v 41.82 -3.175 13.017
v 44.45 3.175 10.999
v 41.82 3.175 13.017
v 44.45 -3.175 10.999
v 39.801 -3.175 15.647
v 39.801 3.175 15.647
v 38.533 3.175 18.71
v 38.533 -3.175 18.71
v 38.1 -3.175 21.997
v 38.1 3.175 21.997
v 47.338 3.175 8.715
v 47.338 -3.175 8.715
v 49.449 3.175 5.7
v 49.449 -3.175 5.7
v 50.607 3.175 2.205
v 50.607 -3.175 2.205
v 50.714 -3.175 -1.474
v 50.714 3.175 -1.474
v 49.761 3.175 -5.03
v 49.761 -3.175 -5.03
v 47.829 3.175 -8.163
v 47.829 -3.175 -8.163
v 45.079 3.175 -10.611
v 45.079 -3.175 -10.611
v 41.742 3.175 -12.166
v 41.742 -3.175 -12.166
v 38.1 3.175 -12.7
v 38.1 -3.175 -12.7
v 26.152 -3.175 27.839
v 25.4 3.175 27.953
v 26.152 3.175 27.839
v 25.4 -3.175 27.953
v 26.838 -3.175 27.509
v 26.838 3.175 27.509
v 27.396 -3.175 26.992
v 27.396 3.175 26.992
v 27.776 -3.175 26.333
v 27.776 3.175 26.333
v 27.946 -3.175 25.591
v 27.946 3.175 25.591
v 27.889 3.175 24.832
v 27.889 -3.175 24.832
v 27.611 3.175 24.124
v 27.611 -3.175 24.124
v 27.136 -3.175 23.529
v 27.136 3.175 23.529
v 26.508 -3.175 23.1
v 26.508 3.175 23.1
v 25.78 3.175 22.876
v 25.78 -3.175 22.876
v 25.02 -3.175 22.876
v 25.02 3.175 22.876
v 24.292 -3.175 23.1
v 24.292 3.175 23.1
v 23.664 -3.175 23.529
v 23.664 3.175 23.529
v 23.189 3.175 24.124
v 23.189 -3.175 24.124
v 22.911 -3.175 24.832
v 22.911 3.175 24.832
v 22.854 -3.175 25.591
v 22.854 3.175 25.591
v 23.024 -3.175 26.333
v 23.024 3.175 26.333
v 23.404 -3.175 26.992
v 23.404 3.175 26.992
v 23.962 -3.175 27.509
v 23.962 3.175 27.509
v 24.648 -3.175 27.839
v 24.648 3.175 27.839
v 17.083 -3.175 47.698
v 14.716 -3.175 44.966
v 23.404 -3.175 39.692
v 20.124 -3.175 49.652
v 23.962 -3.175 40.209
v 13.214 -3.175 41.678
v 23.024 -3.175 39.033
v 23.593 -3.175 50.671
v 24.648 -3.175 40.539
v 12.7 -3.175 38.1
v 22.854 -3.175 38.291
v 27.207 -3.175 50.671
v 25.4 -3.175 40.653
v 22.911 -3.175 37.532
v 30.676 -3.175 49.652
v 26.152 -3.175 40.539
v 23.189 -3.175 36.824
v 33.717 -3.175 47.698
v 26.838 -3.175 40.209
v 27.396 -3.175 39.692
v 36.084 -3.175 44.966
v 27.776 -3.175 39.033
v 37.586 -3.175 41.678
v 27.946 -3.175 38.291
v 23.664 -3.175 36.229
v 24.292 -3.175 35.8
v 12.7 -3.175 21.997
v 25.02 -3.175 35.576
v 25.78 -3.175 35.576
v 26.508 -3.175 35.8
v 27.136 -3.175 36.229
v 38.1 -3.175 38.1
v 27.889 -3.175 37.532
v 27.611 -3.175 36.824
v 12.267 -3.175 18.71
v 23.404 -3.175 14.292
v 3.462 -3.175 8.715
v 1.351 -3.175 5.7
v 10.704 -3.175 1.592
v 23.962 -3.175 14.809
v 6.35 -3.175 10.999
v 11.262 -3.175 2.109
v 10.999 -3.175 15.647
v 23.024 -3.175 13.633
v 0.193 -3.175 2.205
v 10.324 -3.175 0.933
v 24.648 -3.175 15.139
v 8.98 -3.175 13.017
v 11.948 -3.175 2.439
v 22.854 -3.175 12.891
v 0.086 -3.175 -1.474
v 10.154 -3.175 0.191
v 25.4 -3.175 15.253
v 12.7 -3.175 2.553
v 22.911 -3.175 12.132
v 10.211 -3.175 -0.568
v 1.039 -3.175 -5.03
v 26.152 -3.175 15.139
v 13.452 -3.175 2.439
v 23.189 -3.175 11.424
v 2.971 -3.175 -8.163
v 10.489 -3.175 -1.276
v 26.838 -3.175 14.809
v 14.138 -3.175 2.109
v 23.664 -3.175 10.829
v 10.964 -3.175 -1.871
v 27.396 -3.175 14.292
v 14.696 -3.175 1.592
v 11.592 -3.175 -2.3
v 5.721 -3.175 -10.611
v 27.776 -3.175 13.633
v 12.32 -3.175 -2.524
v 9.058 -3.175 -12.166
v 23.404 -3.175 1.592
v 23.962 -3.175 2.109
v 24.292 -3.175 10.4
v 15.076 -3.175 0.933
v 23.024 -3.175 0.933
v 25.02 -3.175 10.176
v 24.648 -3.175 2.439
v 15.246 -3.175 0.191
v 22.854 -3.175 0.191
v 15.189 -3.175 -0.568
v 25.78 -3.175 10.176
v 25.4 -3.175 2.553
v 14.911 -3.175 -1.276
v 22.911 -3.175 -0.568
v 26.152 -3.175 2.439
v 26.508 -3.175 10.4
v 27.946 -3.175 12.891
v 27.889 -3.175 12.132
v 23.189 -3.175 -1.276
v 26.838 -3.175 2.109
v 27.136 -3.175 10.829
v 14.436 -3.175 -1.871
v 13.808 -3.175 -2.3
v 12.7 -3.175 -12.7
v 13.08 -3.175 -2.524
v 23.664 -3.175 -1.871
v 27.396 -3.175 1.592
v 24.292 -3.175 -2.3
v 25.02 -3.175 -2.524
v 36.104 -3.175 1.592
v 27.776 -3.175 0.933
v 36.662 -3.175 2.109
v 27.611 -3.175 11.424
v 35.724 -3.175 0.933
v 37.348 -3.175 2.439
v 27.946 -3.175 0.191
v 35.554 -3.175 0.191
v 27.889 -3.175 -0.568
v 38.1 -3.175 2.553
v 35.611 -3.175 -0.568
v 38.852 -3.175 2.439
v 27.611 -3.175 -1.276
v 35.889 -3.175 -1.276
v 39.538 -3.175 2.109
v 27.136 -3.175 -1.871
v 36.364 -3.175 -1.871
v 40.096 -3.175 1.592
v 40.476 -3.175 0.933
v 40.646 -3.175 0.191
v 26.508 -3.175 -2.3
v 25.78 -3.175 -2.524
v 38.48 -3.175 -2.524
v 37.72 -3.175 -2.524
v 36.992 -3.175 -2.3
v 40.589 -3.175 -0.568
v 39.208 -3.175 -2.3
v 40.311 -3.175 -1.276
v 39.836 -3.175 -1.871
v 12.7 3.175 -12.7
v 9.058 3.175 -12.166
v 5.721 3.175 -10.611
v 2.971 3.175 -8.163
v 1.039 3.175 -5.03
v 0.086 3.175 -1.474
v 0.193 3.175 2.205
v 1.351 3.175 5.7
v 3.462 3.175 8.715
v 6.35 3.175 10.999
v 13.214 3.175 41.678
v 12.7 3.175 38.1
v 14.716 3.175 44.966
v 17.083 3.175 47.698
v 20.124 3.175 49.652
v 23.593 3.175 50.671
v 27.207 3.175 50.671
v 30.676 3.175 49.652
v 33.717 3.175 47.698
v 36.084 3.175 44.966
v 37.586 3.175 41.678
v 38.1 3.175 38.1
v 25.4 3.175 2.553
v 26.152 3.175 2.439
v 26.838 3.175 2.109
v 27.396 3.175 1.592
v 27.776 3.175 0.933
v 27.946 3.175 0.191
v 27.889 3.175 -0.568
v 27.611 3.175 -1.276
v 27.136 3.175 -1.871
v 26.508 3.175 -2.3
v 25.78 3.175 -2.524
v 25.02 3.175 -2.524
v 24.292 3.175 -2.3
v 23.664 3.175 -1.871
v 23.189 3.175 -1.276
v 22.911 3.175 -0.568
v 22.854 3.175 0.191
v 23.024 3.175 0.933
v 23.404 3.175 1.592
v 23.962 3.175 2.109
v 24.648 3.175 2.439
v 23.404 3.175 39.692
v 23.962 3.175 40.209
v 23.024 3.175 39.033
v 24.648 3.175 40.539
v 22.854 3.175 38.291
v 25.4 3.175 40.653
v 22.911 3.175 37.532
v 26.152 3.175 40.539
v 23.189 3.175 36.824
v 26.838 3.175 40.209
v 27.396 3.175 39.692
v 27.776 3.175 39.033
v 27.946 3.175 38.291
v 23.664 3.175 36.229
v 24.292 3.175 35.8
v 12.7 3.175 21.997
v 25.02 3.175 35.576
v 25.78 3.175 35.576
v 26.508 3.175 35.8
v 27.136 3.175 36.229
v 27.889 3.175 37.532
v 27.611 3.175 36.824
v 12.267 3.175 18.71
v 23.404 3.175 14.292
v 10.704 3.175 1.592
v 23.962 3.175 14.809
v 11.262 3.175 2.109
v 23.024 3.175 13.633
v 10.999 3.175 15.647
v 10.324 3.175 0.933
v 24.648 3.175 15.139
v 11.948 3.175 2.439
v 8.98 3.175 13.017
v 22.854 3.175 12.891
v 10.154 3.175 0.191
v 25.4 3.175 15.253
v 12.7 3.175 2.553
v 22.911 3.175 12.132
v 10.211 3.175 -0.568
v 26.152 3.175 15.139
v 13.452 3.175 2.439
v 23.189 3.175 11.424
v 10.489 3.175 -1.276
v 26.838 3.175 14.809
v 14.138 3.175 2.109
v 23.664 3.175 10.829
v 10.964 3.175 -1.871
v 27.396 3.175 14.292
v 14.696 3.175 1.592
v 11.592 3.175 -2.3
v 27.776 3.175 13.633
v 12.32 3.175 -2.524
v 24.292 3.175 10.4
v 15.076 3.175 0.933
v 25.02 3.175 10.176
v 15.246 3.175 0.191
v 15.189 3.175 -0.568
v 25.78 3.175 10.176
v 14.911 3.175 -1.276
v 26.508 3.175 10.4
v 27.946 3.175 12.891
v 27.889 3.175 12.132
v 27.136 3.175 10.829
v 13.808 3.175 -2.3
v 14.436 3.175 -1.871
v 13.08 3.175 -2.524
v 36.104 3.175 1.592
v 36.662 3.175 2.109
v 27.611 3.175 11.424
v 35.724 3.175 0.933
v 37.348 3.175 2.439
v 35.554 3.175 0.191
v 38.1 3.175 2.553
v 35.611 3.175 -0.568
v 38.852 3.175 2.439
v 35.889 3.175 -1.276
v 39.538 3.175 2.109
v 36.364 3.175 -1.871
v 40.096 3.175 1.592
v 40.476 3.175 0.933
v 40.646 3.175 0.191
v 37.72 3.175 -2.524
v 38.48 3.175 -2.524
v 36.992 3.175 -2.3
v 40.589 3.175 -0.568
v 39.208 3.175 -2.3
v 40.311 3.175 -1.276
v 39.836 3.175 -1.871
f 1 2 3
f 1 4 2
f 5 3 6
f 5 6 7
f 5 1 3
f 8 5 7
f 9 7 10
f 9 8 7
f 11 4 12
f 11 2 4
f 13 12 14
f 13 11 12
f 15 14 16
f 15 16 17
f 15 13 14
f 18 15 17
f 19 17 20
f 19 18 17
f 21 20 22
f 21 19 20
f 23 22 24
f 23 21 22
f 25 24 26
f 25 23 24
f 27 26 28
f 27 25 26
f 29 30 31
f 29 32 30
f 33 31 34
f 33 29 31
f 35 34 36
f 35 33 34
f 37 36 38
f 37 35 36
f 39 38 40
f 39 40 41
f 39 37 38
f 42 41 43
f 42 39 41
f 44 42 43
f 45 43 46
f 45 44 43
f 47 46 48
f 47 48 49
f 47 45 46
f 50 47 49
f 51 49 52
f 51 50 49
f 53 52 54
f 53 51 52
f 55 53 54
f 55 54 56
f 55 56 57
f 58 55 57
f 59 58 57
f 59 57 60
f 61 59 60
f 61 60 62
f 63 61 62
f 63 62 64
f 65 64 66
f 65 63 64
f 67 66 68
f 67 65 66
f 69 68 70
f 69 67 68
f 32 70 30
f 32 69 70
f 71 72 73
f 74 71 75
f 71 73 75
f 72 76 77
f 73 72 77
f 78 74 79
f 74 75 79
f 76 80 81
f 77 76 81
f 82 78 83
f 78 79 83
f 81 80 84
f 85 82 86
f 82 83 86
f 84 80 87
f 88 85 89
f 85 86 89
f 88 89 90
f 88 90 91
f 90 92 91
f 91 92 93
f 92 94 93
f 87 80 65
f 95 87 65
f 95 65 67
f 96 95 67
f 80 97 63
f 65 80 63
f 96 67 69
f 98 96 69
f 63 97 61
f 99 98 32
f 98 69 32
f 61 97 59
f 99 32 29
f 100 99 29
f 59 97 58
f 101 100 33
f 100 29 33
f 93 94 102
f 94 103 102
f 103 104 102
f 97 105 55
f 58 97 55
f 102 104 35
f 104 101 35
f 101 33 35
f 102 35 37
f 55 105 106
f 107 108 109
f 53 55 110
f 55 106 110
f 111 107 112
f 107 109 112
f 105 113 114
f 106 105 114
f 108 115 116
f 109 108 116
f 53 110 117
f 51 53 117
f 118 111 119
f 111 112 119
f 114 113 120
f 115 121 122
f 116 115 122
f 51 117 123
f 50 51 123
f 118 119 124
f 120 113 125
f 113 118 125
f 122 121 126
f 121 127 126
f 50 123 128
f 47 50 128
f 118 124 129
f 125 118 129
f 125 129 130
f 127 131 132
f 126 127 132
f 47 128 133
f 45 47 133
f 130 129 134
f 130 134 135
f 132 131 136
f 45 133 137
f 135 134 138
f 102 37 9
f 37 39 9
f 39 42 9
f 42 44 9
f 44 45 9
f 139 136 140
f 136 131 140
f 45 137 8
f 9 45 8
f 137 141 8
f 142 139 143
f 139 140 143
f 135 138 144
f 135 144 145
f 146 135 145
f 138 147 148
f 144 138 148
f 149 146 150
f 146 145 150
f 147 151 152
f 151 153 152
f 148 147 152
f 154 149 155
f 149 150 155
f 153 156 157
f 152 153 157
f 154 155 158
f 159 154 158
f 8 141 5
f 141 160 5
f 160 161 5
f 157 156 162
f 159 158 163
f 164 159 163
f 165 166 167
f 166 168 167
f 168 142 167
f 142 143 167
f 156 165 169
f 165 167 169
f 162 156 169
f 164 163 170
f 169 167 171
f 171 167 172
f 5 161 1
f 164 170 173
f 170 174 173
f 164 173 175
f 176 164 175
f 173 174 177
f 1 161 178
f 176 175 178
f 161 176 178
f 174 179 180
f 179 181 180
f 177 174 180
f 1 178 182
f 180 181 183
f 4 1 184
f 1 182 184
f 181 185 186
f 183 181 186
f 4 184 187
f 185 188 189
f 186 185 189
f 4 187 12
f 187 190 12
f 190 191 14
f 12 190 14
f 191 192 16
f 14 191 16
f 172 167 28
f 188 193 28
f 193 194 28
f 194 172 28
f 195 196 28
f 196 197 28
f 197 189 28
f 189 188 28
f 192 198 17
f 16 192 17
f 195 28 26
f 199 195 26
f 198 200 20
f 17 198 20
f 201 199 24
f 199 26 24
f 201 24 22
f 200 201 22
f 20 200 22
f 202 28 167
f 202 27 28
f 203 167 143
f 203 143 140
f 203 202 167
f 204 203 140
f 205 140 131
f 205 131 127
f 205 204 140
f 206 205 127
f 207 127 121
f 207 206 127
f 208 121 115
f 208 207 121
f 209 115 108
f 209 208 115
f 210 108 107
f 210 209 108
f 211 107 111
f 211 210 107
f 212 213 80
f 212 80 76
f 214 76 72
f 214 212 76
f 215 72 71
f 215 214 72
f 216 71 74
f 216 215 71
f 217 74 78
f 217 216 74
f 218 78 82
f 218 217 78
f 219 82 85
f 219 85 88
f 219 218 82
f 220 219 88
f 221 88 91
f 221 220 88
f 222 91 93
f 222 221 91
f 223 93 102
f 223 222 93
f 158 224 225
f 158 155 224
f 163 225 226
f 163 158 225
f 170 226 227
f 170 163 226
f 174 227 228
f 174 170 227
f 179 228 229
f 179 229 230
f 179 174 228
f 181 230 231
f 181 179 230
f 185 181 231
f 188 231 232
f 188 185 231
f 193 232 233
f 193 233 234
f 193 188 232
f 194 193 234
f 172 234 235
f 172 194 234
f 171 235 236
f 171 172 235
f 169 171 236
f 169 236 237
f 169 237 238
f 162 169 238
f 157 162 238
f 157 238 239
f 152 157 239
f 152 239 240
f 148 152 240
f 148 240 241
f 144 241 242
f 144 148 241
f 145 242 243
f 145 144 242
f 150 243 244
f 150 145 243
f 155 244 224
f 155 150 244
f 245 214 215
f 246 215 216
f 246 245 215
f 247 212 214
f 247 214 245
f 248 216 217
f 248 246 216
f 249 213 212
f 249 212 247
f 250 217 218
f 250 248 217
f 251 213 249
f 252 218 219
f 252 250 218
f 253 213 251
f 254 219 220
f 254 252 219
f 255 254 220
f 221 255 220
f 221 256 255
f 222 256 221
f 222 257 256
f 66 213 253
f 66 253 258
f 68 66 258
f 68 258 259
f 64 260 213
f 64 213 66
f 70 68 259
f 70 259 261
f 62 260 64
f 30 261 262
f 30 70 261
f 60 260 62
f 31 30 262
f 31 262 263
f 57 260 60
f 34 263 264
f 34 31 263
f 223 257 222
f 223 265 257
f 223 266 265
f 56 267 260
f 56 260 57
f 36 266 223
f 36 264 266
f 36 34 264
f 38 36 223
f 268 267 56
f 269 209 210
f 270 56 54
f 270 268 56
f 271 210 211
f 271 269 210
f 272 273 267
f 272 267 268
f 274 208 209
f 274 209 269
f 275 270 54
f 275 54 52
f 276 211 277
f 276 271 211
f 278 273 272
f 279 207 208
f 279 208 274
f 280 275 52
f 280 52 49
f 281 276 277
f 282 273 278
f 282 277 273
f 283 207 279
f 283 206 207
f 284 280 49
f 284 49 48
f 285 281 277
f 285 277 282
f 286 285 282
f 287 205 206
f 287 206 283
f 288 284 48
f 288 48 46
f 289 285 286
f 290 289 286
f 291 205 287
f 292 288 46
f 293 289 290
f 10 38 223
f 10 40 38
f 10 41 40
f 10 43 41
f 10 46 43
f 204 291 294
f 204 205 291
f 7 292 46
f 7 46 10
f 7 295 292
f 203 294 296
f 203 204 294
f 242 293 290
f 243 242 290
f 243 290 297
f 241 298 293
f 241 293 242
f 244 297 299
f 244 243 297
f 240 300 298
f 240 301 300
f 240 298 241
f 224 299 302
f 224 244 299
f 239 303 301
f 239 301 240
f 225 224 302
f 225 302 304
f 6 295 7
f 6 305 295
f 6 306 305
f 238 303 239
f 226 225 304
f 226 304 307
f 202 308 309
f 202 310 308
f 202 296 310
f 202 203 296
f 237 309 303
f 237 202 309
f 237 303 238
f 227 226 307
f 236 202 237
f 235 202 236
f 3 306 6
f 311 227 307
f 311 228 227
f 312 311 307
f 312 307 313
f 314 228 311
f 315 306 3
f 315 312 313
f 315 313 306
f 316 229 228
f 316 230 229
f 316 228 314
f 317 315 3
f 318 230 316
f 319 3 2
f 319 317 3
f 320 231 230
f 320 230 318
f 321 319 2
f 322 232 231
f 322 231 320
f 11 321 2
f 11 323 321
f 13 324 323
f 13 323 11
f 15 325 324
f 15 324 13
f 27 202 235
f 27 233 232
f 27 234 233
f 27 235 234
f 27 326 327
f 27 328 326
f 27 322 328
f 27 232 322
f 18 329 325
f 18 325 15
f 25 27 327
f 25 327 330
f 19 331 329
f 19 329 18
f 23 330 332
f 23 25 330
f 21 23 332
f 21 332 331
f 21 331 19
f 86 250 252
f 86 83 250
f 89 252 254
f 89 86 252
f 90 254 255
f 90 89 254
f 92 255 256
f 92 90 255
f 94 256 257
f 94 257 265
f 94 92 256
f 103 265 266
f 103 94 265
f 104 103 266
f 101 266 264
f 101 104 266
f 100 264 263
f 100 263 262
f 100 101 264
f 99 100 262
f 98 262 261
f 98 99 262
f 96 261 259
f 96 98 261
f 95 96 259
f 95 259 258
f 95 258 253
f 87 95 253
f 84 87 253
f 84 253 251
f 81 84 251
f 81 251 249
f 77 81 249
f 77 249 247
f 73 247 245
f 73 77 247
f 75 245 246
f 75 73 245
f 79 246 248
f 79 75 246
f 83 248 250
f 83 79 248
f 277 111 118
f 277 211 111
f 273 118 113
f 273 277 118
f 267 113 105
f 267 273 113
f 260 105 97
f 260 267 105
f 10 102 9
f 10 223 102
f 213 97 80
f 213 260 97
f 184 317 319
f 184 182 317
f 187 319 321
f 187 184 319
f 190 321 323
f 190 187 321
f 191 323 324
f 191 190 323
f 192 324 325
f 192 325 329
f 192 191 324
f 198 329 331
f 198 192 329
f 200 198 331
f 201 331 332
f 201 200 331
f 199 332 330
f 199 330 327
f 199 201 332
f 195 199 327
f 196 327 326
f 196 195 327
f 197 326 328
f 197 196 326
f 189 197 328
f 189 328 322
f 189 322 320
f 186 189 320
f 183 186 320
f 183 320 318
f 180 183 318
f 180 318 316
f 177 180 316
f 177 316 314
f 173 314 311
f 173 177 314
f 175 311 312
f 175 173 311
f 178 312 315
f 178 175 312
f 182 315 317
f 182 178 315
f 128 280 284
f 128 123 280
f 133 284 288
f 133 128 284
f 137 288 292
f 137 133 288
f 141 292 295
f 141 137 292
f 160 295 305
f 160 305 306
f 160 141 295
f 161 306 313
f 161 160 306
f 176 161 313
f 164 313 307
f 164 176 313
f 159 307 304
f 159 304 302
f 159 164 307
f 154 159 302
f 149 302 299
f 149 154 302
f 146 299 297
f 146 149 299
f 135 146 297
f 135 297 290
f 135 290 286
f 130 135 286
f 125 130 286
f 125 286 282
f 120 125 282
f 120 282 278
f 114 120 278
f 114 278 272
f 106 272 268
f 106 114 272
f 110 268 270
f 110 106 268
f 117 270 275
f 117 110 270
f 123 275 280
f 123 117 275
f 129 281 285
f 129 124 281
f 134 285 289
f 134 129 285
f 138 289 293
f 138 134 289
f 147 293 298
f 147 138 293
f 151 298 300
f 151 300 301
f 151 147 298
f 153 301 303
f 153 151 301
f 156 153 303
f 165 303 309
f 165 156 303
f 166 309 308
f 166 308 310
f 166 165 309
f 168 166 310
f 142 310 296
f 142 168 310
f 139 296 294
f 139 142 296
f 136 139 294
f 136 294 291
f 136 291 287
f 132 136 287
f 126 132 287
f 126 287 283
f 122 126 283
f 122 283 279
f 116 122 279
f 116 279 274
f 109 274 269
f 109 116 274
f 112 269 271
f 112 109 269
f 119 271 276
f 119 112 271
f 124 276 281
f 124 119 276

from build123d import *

# Parameters (mm, degrees)
SKETCH1_R           = 2.5527
BOSS_EXTRUDE1_DEPTH = 3.175
FILLET1_R           = 12.7


with BuildPart() as part:
    # Sketch1 → Boss-Extrude1 (new, symmetric)
    with BuildSketch(Plane(origin=(0, 0, 0), x_dir=(1, 0, 0), z_dir=(0, 1, 0))):
        with BuildLine():
            ThreePointArc((12.7, 12.7), (0, 0), (12.7, -12.7))
            Line((12.7, -12.7), (12.7, -38.1))
            ThreePointArc((12.7, -38.1), (25.4, -50.8), (38.1, -38.1))
            Line((38.1, -38.1), (38.1, -12.7))
            ThreePointArc((38.1, -12.7), (50.8, 0), (38.1, 12.7))
            Line((38.1, 12.7), (12.7, 12.7))
        make_face()
        with Locations(Location((25.4, -12.7, 0), (0, 0, 270))):
            Circle(SKETCH1_R, mode=Mode.SUBTRACT)
        with Locations(Location((12.7, 0, 0), (0, 0, 270))):
            Circle(SKETCH1_R, mode=Mode.SUBTRACT)
        with Locations(Location((38.1, 0, 0), (0, 0, 270))):
            Circle(SKETCH1_R, mode=Mode.SUBTRACT)
        with Locations(Location((25.4, 0, 0), (0, 0, 270))):
            Circle(SKETCH1_R, mode=Mode.SUBTRACT)
        with Locations(Location((25.4, -25.4, 0), (0, 0, 270))):
            Circle(SKETCH1_R, mode=Mode.SUBTRACT)
        with Locations(Location((25.4, -38.1, 0), (0, 0, 270))):
            Circle(SKETCH1_R, mode=Mode.SUBTRACT)
    extrude(amount=BOSS_EXTRUDE1_DEPTH, both=True)

    # Fillet1
    fillet1_edges = [part.edges().sort_by_distance(p)[0] for p in [
        (38.1, 0, 12.7),
        (12.7, 0, 12.7),
    ]]
    fillet(fillet1_edges, radius=FILLET1_R)


solid = part.part
